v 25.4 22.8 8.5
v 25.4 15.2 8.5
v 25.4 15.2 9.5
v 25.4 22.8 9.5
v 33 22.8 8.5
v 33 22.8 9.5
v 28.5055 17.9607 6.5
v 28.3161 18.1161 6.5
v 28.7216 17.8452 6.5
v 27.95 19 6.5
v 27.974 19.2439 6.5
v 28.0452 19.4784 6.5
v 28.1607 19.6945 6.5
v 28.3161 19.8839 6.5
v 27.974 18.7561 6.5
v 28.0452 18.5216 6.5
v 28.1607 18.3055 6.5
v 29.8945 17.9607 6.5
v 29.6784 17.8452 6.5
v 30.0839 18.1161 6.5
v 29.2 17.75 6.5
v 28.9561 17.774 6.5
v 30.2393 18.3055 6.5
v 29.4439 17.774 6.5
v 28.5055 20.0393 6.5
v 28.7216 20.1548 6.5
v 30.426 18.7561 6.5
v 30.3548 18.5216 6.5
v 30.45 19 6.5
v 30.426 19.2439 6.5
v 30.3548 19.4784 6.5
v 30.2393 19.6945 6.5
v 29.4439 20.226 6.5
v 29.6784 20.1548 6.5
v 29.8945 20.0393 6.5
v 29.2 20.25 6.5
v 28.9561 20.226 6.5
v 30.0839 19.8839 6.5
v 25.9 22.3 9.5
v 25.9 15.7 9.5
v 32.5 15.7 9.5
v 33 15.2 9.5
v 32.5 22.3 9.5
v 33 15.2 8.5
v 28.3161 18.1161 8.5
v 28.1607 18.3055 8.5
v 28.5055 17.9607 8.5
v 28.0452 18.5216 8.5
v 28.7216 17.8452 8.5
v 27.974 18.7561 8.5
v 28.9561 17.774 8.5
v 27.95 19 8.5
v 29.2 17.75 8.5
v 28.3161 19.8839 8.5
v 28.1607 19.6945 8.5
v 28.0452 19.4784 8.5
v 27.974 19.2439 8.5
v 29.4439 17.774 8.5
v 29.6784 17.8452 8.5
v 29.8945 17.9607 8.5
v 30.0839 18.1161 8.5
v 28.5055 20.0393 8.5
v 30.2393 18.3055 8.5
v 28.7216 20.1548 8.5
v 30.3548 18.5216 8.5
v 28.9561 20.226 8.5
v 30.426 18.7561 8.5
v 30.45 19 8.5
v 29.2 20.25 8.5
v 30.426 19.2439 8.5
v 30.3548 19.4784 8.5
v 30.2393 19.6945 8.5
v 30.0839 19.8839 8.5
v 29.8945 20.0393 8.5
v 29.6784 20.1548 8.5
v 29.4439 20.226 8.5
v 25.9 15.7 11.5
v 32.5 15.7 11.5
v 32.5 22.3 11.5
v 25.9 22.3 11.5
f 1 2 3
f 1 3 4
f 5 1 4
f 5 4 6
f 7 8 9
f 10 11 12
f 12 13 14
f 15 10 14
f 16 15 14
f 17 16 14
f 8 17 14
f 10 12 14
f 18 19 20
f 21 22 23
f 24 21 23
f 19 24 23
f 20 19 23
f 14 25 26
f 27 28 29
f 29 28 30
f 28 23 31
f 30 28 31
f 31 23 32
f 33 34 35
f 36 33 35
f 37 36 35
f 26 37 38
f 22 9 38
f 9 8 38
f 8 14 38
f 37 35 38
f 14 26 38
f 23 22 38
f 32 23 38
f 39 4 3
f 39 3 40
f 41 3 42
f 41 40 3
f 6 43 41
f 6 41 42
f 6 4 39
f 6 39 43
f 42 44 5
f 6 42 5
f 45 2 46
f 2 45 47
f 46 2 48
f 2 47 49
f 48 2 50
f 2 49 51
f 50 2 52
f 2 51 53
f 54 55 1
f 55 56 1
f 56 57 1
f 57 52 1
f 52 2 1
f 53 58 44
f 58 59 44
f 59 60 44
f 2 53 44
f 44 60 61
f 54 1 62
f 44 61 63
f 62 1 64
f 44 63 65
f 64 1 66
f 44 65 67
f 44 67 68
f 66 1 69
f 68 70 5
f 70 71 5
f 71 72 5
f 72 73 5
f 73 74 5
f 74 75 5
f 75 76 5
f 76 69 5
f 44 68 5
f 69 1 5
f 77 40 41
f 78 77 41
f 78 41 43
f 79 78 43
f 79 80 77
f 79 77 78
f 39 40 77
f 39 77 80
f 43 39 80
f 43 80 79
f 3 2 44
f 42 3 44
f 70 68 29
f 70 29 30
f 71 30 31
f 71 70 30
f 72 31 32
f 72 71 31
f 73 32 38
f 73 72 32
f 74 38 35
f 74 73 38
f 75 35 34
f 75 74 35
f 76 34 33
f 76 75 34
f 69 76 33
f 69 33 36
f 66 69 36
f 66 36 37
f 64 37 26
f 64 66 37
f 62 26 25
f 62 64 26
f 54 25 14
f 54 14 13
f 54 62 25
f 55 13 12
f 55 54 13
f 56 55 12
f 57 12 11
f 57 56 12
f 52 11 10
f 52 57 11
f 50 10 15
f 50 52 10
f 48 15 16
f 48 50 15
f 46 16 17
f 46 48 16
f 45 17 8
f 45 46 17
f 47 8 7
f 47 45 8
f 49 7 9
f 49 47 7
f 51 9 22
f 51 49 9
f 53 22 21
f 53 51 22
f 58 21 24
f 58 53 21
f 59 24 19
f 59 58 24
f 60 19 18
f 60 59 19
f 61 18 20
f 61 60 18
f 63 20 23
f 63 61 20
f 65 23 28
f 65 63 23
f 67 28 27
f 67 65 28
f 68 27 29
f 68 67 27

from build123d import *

# Parameters (mm, degrees)
SKETCH009_W  = 6.6
SKETCH009_H  = 6.6
PAD006_DEPTH = 3
SKETCH010_W  = 7.6
SKETCH010_H  = 7.6
PAD007_DEPTH = 1
SKETCH011_R  = 1.25
PAD008_DEPTH = 2


with BuildPart() as part:
    # Sketch009 → Pad006 (new body)
    with BuildSketch(Plane.XY):
        with Locations((29.2, 19)):
            Rectangle(SKETCH009_W, SKETCH009_H)
    extrude(amount=PAD006_DEPTH)

    # Sketch010 → Pad007 (join)
    with BuildSketch(Plane.XY):
        with Locations((29.2, 19)):
            Rectangle(SKETCH010_W, SKETCH010_H)
    extrude(amount=PAD007_DEPTH)

    # Sketch011 → Pad008 (join)
    with BuildSketch(Plane.XY):
        with Locations((29.2, 19)):
            Circle(SKETCH011_R)
    extrude(amount=-PAD008_DEPTH)


with BuildPart() as part_1:
    # Body004 placement: moved
    add(part.part.moved(Location((0, 0, 8.5))))


solid = part_1.part
